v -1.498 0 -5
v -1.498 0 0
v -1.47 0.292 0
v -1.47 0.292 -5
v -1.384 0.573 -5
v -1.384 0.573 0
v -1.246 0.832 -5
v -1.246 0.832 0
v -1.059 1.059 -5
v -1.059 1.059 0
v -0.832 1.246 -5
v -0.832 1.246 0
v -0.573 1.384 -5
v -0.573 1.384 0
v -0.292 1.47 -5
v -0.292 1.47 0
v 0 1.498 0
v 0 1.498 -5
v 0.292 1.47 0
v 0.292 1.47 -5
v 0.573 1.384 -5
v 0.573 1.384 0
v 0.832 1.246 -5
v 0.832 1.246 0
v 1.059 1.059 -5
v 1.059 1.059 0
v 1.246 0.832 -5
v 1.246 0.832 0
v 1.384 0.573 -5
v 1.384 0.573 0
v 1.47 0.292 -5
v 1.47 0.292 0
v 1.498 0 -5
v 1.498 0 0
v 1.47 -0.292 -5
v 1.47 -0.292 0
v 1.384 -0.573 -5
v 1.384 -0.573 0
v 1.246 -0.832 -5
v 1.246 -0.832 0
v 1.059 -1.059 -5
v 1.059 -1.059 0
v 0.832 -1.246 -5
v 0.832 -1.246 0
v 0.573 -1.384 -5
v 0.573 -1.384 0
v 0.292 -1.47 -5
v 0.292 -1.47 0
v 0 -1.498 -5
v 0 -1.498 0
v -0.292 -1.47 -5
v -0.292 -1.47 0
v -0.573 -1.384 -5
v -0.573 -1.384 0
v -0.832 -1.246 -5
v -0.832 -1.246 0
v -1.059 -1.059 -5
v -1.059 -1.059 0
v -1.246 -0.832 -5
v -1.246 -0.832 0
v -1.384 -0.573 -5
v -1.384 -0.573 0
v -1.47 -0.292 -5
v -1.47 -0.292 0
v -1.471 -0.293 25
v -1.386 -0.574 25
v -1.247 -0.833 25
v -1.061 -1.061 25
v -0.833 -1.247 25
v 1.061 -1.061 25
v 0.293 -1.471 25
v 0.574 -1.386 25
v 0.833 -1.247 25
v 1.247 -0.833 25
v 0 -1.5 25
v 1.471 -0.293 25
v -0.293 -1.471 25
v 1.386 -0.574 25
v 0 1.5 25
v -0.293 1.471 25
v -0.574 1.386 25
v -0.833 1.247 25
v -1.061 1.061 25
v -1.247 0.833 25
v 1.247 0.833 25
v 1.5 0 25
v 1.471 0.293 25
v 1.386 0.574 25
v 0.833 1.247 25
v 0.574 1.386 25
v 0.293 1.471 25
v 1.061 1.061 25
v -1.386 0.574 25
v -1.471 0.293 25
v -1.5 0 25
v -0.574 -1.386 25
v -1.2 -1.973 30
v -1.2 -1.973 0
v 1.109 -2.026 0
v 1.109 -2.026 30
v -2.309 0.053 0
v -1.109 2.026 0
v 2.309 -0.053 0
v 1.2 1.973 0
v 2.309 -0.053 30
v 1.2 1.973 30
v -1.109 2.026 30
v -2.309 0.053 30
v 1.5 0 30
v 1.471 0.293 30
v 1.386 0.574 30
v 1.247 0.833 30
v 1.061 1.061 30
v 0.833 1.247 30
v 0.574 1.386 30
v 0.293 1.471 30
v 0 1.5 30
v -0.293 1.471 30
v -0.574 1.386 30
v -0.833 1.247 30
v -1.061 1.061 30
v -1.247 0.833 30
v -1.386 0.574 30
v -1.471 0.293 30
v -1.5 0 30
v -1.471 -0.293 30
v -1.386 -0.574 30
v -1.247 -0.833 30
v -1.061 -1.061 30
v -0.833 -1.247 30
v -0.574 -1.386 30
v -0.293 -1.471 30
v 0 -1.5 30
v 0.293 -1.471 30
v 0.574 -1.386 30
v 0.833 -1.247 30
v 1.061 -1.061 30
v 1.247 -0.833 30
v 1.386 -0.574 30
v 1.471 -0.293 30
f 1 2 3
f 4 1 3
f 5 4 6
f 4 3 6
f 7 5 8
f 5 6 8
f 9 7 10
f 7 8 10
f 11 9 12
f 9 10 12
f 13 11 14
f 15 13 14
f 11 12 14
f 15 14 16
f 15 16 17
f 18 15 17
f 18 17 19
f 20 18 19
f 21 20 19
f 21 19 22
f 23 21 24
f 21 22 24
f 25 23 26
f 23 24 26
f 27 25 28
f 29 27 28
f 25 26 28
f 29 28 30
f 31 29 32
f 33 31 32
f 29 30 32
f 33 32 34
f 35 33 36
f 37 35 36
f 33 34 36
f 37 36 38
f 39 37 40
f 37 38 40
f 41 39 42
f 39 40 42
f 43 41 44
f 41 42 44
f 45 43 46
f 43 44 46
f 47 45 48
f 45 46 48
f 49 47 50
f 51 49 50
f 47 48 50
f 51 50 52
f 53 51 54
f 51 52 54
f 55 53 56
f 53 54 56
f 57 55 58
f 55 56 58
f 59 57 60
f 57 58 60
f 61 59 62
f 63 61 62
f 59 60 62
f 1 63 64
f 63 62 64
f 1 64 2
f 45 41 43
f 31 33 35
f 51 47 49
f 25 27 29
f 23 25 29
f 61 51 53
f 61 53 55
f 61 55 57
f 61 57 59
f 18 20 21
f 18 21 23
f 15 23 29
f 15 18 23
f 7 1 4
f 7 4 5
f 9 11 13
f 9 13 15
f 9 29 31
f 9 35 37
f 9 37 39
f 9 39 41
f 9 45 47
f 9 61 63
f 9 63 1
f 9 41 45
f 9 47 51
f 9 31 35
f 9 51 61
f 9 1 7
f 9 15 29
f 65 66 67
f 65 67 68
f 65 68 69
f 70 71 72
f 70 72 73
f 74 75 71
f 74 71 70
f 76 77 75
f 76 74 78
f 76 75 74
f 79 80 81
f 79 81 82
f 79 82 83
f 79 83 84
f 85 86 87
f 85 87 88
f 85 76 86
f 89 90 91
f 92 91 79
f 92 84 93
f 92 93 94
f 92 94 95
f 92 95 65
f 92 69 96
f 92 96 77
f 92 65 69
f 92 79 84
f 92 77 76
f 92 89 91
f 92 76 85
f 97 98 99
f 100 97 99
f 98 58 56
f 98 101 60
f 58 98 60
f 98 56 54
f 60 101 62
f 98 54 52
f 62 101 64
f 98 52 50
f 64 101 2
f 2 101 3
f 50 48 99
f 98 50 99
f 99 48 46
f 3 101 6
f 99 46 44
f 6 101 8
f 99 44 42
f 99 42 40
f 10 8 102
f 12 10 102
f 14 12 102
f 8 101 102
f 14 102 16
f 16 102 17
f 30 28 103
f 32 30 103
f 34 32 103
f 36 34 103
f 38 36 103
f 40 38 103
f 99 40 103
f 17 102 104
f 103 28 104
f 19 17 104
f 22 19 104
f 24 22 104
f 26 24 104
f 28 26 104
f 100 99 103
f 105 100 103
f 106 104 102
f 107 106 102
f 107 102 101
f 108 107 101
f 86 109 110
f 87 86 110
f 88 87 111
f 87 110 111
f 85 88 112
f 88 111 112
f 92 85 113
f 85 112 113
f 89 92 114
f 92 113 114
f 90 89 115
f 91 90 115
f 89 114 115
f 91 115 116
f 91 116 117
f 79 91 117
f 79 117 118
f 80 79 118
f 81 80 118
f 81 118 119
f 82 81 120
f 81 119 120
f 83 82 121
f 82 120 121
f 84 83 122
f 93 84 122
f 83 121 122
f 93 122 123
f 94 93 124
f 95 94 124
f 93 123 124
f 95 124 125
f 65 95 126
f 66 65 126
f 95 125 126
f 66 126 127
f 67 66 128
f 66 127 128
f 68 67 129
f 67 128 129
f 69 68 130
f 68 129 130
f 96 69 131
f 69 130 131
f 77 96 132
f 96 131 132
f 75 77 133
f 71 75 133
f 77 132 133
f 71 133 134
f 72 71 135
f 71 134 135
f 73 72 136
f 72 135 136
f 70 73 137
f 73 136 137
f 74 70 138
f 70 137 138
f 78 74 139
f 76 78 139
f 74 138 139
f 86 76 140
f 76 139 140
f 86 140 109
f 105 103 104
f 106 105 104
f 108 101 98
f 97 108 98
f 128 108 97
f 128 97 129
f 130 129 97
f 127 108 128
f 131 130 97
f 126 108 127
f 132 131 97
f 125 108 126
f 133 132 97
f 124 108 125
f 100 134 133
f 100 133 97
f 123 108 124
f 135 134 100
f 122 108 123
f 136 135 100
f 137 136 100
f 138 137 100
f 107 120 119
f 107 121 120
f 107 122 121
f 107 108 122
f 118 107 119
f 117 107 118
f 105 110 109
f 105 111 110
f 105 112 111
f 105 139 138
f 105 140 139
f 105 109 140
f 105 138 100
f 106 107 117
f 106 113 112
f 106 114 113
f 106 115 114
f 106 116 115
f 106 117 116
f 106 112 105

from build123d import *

# Parameters (mm, degrees)
EXTRUDE_2_DEPTH     = 30
SKETCH_5_R          = 1.498354352
EXTRUDE_3_DEPTH     = 5
SKETCH_6_R          = 1.5
CUT_EXTRUDE_1_DEPTH = 5


with BuildPart() as part:
    # 草图4 → 凸台-拉伸2 (new body)
    with BuildSketch(Plane.XY):
        Polygon((1.108848503, -2.025780919), (2.30880199, -0.052599487), (1.199953487, 1.973181432), (-1.108848503, 2.025780919), (-2.30880199, 0.052599487), (-1.199953487, -1.973181432), align=None)
    extrude(amount=EXTRUDE_2_DEPTH)

    # 草图5 → 凸台-拉伸3 (add)
    with BuildSketch(Plane(origin=(0, 0, 0), x_dir=(-1, 0, 0), z_dir=(0, 0, -1))):
        Circle(SKETCH_5_R)
    extrude(amount=EXTRUDE_3_DEPTH)

    # 草图6 → 切除-拉伸1 (cut)
    with BuildSketch(Plane.XY.offset(30)):
        Circle(SKETCH_6_R)
    extrude(amount=-CUT_EXTRUDE_1_DEPTH, mode=Mode.SUBTRACT)


solid = part.part
